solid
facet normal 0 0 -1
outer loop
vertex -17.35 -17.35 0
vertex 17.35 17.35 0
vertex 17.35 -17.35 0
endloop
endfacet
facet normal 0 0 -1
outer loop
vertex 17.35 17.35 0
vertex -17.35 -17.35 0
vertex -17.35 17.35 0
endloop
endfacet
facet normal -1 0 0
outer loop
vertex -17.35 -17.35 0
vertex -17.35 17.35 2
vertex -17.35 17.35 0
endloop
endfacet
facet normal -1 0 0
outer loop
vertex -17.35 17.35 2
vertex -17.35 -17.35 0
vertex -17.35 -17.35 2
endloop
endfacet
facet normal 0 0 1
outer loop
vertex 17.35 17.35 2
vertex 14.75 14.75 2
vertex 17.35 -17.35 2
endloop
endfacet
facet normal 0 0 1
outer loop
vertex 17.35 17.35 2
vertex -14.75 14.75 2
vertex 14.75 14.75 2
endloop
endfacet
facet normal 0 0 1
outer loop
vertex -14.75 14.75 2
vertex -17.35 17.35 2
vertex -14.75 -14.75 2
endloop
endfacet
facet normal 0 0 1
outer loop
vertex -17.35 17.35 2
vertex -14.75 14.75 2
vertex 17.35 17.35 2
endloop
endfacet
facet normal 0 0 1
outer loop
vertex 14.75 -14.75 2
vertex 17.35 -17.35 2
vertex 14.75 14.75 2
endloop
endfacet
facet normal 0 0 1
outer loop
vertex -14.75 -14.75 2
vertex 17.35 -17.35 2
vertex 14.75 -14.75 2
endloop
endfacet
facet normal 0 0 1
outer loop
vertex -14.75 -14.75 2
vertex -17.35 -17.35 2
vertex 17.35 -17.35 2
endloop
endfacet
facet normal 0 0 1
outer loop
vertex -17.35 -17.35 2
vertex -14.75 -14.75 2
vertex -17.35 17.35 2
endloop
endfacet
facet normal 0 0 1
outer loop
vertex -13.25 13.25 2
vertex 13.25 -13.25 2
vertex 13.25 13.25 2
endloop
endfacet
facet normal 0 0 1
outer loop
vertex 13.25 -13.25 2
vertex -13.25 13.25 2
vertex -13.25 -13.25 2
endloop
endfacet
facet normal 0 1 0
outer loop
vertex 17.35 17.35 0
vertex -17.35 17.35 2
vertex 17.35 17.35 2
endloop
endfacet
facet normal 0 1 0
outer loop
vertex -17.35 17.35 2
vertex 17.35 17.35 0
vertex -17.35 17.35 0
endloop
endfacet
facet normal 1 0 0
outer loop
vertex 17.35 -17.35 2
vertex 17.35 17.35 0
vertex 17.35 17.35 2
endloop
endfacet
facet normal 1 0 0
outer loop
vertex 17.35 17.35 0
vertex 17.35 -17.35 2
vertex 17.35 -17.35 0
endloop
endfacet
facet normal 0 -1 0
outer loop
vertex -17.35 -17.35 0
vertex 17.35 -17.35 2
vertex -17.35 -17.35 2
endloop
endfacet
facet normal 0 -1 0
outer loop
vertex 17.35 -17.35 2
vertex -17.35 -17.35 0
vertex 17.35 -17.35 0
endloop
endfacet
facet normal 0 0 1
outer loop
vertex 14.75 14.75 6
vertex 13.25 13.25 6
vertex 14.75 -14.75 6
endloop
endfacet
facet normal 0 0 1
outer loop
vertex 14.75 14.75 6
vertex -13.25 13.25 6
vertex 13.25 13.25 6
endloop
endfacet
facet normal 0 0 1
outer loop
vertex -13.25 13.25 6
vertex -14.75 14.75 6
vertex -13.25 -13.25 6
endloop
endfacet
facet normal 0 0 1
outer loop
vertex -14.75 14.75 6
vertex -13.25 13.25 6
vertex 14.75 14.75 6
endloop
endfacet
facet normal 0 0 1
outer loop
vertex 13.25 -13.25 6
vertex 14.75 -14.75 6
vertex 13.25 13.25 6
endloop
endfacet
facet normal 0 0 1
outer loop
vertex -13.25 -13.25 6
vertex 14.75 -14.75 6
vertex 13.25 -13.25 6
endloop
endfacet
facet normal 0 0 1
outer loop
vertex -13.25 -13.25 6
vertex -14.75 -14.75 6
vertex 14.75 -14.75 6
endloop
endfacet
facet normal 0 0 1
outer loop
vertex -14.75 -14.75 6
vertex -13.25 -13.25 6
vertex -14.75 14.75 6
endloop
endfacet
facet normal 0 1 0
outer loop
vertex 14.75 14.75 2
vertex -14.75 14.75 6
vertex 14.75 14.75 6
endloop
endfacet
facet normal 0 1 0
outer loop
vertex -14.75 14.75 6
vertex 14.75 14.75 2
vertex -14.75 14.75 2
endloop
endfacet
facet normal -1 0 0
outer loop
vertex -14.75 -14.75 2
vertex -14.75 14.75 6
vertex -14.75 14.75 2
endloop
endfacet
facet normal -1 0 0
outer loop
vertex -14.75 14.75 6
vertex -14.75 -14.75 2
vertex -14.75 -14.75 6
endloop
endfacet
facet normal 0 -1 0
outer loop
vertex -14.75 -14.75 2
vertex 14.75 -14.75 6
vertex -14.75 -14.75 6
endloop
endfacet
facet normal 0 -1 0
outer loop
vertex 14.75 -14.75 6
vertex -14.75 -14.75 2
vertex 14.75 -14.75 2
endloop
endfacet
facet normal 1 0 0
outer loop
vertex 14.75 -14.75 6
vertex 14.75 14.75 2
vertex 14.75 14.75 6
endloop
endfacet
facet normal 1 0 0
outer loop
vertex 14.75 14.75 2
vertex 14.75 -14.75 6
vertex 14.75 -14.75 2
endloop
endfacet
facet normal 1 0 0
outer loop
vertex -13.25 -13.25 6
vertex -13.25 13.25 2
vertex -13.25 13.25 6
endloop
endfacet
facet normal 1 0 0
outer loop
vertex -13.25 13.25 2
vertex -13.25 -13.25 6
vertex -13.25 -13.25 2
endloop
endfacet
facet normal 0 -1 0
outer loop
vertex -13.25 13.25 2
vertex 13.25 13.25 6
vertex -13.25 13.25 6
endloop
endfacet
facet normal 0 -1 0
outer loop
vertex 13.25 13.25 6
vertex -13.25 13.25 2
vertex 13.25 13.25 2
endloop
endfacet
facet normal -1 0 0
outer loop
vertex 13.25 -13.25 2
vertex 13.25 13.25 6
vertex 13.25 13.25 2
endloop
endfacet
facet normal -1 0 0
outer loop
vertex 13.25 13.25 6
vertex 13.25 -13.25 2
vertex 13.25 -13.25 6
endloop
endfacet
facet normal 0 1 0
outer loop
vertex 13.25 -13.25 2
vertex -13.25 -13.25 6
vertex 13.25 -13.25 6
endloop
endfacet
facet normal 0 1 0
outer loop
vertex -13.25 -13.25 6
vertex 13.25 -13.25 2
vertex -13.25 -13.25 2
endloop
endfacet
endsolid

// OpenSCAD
// file: ../diffuser.scad
// Swappable diffuser panel. Thickness is the STL knob; the diffusing structure
// (gyroid/grid, density, top/bottom solid layers = 0) is set in the slicer.

module diffuser_panel(t) {
    linear_extrude(t) square([panel_side, panel_side], center = true);
}

// Diffuser LID = flanged plug. The plug drops INTO the opening (locates it, light
// grip so it won't slide); the flange overhangs by ~the wall width and rests on
// the rim so it can't fall through. Lifts straight off for swapping, and works on
// touching chimneys (the plug uses the open hole, not the side walls). The flange
// is the diffuser face (thickness t). Set lid_plug_h = 0 for a plain flat tile.
// Modeled diffuser-face-down (z=0..t) = print orientation; flip in use.
module diffuser_lid(t) {
    fside = cell_inner + 2 * lid_flange_cover - lid_flange_gap;  // flange (rests on the rim)
    pside = cell_inner - lid_plug_clear;                          // plug (drops into the opening)
    union() {
        linear_extrude(t) square([fside, fside], center = true); // flange / diffuser face
        if (lid_plug_h > 0)
            translate([0, 0, t])
                linear_extrude(lid_plug_h)
                    difference() {
                        square([pside, pside], center = true);
                        square([pside - 2 * lid_plug_wall, pside - 2 * lid_plug_wall], center = true);
                    }
    }
}

// Slide-over diffuser CAP: a diffuser top + a skirt that slides over the OUTSIDE
// of a chimney. Only works on an ISOLATED column (needs side clearance for the
// skirt) — kept for possible use on the real letters, NOT the touching coupon.
// Modeled diffuser-face-down (z=0..t) = print orientation.
module diffuser_cap(t) {
    si = cell_pitch + cap_fit_clear;      // skirt inner — slides over the chimney outer
    so = si + 2 * cap_skirt_t;            // skirt outer
    union() {
        linear_extrude(t) square([so, so], center = true);          // diffuser face
        translate([0, 0, t])
            linear_extrude(cap_skirt_h)                             // skirt
                difference() {
                    square([so, so], center = true);
                    square([si, si], center = true);
                }
    }
}
// file: ../config.scad
// ===== CHARGE LED sign — global config =====
// Edit this file; then run ./build.sh to regenerate every STL.

$fn = 72;

// ---- calibrated collar (press-fit for 12mm bullet pixel) ----
collar_stl    = "../../assets/bullet-collar.stl"; // path resolved from src/parts/ entry files
collar_h      = 2.0;     // Z span of the collar STL
collar_od     = 16.0;    // collar outer diameter
collar_cx     = 43.0;    // STL native X center (Y center is 0)
pixel_through = 12.3;    // clearance hole through the plate (just over bore Ø12.19)
dome_clear    = 4.0;     // dome protrusion above plate front. Spec: 5.5mm dome-tip-to-flange,
                         // flange seats on plate back, minus 2mm plate ~= 3.5-4mm. Seat a real
                         // pixel and measure to lock it in.

// ---- shell ----
plate_t    = 2.0;        // rear plate thickness (== collar_h, so the collar sits flush)
wall_t     = 2.5;        // chimney wall thickness
cell_inner = 30;         // square interior of each test cell (the press-fit opening)

// ---- diffuser panels (flat, drop-in — kept for the final glued option) ----
panel_press_clear = 0.25; // panel is this much SMALLER than the opening (total) -> friction fit
panel_thicks      = [1, 2, 3];

// ---- diffuser CAP (slides over an ISOLATED chimney; not used on touching rows) ----
cap_fit_clear = 0.4;   // skirt-inner minus chimney-outer (total); bigger = looser slide
cap_skirt_t   = 1.6;   // skirt wall thickness
cap_skirt_h   = 7;     // how far the skirt grips down over the chimney

// ---- diffuser LID = flanged plug (plug locates in the opening, flange catches on the rim) ----
lid_flange_cover = wall_t;  // flange overhang per side ~= wall width (rests on rim, can't fall in)
lid_flange_gap   = 0.3;     // shrink the flange a hair so neighbour lids don't clash
lid_plug_h       = 4;       // how far the plug drops into the opening (0 = plain flat tile)
lid_plug_clear   = 0.5;     // plug-outer = opening minus this (total) -> snug slip fit
lid_plug_wall    = 1.5;     // plug-frame wall thickness

// ---- coupon depth ladder ----
led_gaps = [20, 35, 50]; // clear LED-tip -> panel distance, per cell (mm)

// ---- collar v2: original bore + lip, plus a 45-deg lead-in chamfer ----
bore_face_r   = 6.10;    // collar bore radius at each face (~Ø12.2)
chamfer_depth = 0.5;     // axial depth of the 45-deg lead-in at each face
mouth_r       = bore_face_r + chamfer_depth;  // chamfer mouth radius (~Ø13.2)

// ---- collar A/B test harness ----
harness_w     = 52;      // tile width
harness_d     = 30;      // tile depth
harness_t     = plate_t; // match the real wall thickness for a faithful fit test
harness_pitch = 24;      // spacing between the two hole centers

// ---- derived ----
cell_pitch = cell_inner + 2 * wall_t;      // outer cell footprint (35)
n_cells    = len(led_gaps);
plate_w    = n_cells * cell_pitch;
plate_d    = cell_pitch;
panel_side = cell_inner - panel_press_clear;
function cell_x(i)     = i * cell_pitch + cell_pitch / 2;
function chimney_H(i)  = plate_t + dome_clear + led_gaps[i];
// main file
// Build target: 2mm flanged-plug diffuser lid.
include <../config.scad>
include <../diffuser.scad>
diffuser_lid(2);
